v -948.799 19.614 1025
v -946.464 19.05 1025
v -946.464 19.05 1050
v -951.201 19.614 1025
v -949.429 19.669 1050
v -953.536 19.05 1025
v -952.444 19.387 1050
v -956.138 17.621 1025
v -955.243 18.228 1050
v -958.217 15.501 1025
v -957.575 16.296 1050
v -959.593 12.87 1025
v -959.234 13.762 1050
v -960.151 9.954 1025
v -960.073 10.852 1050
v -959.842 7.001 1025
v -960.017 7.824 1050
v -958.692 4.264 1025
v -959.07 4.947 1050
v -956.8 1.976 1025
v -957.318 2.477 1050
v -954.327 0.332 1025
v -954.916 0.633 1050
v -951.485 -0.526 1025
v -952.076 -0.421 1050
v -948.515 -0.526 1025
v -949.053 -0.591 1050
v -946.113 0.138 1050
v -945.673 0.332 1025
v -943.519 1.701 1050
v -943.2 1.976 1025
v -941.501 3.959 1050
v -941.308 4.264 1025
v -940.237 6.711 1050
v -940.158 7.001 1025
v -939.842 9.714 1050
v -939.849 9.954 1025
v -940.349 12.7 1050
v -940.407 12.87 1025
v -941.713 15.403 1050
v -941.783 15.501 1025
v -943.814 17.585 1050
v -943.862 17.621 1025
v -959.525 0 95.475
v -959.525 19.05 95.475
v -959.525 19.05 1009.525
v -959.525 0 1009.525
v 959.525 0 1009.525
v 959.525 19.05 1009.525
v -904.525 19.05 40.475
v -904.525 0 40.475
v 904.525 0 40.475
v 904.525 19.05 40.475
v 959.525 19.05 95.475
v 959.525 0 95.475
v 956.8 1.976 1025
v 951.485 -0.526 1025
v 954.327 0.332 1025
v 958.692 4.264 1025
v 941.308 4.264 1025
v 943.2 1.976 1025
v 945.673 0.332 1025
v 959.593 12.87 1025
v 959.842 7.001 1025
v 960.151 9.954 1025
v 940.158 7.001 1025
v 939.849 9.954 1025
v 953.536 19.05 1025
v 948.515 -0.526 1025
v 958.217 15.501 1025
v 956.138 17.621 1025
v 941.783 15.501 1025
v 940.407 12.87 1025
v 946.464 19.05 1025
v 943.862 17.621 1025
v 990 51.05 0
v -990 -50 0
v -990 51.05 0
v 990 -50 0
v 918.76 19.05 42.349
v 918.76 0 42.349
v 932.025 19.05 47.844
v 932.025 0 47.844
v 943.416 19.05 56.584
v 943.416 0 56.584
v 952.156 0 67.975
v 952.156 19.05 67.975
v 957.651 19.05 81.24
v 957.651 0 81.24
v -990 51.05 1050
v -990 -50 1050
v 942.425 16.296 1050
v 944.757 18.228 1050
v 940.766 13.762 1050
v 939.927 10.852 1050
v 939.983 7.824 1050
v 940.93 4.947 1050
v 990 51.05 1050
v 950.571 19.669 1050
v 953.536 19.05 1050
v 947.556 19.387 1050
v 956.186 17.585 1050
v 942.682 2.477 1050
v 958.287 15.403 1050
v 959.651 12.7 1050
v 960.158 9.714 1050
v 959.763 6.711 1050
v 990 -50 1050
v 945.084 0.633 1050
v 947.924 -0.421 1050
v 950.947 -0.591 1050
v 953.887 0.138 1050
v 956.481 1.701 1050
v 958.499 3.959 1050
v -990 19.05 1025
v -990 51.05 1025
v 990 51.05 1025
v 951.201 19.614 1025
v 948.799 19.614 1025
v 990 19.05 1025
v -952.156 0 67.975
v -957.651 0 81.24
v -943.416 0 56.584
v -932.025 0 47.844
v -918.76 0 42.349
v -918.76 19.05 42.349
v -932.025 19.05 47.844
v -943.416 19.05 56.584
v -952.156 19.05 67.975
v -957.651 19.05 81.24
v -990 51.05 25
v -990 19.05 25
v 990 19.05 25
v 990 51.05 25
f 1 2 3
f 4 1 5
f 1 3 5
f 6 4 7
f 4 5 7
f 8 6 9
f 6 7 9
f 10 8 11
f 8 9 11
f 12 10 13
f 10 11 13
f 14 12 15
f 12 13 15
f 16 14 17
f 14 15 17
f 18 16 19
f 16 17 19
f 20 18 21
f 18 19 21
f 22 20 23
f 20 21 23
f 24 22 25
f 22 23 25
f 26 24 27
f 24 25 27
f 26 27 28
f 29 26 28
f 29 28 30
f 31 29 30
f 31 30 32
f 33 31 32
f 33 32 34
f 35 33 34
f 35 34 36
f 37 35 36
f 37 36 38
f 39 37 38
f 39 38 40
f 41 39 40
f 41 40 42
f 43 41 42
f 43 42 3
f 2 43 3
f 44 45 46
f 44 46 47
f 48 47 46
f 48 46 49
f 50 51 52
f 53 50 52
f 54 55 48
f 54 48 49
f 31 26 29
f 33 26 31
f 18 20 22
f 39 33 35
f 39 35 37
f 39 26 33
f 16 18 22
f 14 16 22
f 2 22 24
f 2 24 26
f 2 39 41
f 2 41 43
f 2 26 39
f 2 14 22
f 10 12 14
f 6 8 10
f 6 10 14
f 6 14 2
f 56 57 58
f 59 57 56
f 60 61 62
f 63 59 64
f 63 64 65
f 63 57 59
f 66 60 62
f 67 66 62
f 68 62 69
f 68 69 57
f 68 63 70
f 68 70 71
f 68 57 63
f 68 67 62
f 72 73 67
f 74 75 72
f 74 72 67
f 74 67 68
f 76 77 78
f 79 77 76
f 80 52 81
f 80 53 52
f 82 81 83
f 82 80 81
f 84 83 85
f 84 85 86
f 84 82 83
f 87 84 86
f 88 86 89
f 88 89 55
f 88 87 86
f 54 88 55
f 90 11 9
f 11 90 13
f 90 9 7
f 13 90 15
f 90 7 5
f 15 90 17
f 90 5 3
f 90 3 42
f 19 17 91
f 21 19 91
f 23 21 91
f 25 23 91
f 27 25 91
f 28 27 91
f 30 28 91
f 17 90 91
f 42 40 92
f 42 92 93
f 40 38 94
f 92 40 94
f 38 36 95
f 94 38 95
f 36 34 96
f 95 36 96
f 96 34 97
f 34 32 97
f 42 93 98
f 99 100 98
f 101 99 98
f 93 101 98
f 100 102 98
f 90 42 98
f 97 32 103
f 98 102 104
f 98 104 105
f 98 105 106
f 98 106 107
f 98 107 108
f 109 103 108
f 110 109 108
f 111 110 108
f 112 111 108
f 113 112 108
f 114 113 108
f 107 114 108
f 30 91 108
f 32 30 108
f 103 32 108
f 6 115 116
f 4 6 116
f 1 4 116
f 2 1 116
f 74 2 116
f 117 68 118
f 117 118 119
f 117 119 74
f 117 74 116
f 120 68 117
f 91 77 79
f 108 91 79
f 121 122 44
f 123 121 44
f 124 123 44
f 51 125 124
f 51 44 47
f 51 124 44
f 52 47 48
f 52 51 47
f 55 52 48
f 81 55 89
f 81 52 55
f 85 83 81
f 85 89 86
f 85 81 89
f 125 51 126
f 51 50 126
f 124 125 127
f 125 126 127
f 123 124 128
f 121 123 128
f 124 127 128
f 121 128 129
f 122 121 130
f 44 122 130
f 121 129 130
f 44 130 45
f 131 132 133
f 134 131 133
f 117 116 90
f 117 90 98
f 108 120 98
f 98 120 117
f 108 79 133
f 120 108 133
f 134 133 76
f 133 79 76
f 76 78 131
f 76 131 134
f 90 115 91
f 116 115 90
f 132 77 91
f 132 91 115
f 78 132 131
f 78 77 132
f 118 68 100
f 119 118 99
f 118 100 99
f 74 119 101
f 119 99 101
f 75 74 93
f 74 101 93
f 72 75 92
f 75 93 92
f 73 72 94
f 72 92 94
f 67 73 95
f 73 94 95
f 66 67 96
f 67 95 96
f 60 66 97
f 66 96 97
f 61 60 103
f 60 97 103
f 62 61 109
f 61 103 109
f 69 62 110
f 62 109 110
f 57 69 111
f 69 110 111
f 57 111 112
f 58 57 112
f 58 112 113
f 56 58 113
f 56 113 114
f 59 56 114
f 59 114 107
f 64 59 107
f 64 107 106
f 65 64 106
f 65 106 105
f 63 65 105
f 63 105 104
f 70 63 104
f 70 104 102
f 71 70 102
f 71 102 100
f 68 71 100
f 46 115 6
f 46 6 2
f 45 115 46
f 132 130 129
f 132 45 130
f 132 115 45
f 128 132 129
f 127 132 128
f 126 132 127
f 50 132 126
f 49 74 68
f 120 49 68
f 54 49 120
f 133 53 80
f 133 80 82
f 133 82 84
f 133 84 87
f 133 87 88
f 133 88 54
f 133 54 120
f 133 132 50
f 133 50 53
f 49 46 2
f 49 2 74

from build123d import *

# Parameters (mm, degrees)
BOSS_EXTRUDE1_DEPTH = 1009.525
SKETCH3_W           = 1919.05
SKETCH3_H           = 40.475
BOSS_EXTRUDE2_DEPTH = 19.05
FILLET1_R           = 55
BOSS_EXTRUDE4_START = -50
SKETCH4_W           = 2000
SKETCH4_H           = 40.475
BOSS_EXTRUDE4_DEPTH = 69.05
BOSS_EXTRUDE6_START = 19.05
SKETCH6_W           = 2000
SKETCH6_H           = 25
BOSS_EXTRUDE6_DEPTH = 32
CUT_EXTRUDE5_START  = 1050
SKETCH5_R           = 10.16
CUT_EXTRUDE5_DEPTH  = 25
SKETCH7_W           = 10
SKETCH7_H           = 101.05
CUT_EXTRUDE6_DEPTH  = 1451.89837773


with BuildPart() as part:
    # Sketch2 → Boss-Extrude1 (new body)
    with BuildSketch(Plane.XY):
        Polygon((-959.525, 0), (959.525, 0), (959.525, 19.05), (1000, 19.05), (1000, -50), (-1000, -50), (-1000, 19.05), (-959.525, 19.05), align=None)
    extrude(amount=BOSS_EXTRUDE1_DEPTH)

    # Sketch3 → Boss-Extrude2 (add)
    with BuildSketch(Plane(origin=(0, 0, 0), x_dir=(1, 0, 0), z_dir=(0, 1, 0))):
        with Locations((0, -20.2375)):
            Rectangle(SKETCH3_W, SKETCH3_H)
    extrude(amount=BOSS_EXTRUDE2_DEPTH)

    # Fillet1
    fillet1_edges = [part.edges().sort_by_distance(p)[0] for p in [
        (959.525, 9.525, 40.475),
        (-959.525, 9.525, 40.475),
    ]]
    fillet(fillet1_edges, radius=FILLET1_R)

    # Sketch4 → Boss-Extrude4 (add)
    with BuildSketch(Plane(origin=(0, 0, 0), x_dir=(1, 0, 0), z_dir=(0, 1, 0)).offset(BOSS_EXTRUDE4_START)):
        with Locations((0, -1029.7625)):
            Rectangle(SKETCH4_W, SKETCH4_H)
    extrude(amount=BOSS_EXTRUDE4_DEPTH)

    # Sketch6 → Boss-Extrude6 (add)
    with BuildSketch(Plane(origin=(0, 0, 0), x_dir=(1, 0, 0), z_dir=(0, 1, 0)).offset(BOSS_EXTRUDE6_START)):
        with Locations((0, -12.5)):
            Rectangle(SKETCH6_W, SKETCH6_H)
        with Locations((0, -1037.5)):
            Rectangle(SKETCH6_W, SKETCH6_H)
    extrude(amount=BOSS_EXTRUDE6_DEPTH)

    # Sketch5 → Cut-Extrude5 (cut)
    with BuildSketch(Plane.XY.offset(CUT_EXTRUDE5_START)):
        with Locations(Location((-950, 9.525, 0), (0, 0, 69.635865194))):
            Circle(SKETCH5_R)
        with Locations(Location((950, 9.525, 0), (0, 0, 69.635865194))):
            Circle(SKETCH5_R)
    extrude(amount=-CUT_EXTRUDE5_DEPTH, mode=Mode.SUBTRACT)

    # Sketch7 → Cut-Extrude6 (cut, through all)
    with BuildSketch(Plane.XY):
        with Locations((-995, 0.525)):
            Rectangle(SKETCH7_W, SKETCH7_H)
        with Locations((995, 0.525)):
            Rectangle(SKETCH7_W, SKETCH7_H)
    extrude(amount=CUT_EXTRUDE6_DEPTH, mode=Mode.SUBTRACT)


solid = part.part
